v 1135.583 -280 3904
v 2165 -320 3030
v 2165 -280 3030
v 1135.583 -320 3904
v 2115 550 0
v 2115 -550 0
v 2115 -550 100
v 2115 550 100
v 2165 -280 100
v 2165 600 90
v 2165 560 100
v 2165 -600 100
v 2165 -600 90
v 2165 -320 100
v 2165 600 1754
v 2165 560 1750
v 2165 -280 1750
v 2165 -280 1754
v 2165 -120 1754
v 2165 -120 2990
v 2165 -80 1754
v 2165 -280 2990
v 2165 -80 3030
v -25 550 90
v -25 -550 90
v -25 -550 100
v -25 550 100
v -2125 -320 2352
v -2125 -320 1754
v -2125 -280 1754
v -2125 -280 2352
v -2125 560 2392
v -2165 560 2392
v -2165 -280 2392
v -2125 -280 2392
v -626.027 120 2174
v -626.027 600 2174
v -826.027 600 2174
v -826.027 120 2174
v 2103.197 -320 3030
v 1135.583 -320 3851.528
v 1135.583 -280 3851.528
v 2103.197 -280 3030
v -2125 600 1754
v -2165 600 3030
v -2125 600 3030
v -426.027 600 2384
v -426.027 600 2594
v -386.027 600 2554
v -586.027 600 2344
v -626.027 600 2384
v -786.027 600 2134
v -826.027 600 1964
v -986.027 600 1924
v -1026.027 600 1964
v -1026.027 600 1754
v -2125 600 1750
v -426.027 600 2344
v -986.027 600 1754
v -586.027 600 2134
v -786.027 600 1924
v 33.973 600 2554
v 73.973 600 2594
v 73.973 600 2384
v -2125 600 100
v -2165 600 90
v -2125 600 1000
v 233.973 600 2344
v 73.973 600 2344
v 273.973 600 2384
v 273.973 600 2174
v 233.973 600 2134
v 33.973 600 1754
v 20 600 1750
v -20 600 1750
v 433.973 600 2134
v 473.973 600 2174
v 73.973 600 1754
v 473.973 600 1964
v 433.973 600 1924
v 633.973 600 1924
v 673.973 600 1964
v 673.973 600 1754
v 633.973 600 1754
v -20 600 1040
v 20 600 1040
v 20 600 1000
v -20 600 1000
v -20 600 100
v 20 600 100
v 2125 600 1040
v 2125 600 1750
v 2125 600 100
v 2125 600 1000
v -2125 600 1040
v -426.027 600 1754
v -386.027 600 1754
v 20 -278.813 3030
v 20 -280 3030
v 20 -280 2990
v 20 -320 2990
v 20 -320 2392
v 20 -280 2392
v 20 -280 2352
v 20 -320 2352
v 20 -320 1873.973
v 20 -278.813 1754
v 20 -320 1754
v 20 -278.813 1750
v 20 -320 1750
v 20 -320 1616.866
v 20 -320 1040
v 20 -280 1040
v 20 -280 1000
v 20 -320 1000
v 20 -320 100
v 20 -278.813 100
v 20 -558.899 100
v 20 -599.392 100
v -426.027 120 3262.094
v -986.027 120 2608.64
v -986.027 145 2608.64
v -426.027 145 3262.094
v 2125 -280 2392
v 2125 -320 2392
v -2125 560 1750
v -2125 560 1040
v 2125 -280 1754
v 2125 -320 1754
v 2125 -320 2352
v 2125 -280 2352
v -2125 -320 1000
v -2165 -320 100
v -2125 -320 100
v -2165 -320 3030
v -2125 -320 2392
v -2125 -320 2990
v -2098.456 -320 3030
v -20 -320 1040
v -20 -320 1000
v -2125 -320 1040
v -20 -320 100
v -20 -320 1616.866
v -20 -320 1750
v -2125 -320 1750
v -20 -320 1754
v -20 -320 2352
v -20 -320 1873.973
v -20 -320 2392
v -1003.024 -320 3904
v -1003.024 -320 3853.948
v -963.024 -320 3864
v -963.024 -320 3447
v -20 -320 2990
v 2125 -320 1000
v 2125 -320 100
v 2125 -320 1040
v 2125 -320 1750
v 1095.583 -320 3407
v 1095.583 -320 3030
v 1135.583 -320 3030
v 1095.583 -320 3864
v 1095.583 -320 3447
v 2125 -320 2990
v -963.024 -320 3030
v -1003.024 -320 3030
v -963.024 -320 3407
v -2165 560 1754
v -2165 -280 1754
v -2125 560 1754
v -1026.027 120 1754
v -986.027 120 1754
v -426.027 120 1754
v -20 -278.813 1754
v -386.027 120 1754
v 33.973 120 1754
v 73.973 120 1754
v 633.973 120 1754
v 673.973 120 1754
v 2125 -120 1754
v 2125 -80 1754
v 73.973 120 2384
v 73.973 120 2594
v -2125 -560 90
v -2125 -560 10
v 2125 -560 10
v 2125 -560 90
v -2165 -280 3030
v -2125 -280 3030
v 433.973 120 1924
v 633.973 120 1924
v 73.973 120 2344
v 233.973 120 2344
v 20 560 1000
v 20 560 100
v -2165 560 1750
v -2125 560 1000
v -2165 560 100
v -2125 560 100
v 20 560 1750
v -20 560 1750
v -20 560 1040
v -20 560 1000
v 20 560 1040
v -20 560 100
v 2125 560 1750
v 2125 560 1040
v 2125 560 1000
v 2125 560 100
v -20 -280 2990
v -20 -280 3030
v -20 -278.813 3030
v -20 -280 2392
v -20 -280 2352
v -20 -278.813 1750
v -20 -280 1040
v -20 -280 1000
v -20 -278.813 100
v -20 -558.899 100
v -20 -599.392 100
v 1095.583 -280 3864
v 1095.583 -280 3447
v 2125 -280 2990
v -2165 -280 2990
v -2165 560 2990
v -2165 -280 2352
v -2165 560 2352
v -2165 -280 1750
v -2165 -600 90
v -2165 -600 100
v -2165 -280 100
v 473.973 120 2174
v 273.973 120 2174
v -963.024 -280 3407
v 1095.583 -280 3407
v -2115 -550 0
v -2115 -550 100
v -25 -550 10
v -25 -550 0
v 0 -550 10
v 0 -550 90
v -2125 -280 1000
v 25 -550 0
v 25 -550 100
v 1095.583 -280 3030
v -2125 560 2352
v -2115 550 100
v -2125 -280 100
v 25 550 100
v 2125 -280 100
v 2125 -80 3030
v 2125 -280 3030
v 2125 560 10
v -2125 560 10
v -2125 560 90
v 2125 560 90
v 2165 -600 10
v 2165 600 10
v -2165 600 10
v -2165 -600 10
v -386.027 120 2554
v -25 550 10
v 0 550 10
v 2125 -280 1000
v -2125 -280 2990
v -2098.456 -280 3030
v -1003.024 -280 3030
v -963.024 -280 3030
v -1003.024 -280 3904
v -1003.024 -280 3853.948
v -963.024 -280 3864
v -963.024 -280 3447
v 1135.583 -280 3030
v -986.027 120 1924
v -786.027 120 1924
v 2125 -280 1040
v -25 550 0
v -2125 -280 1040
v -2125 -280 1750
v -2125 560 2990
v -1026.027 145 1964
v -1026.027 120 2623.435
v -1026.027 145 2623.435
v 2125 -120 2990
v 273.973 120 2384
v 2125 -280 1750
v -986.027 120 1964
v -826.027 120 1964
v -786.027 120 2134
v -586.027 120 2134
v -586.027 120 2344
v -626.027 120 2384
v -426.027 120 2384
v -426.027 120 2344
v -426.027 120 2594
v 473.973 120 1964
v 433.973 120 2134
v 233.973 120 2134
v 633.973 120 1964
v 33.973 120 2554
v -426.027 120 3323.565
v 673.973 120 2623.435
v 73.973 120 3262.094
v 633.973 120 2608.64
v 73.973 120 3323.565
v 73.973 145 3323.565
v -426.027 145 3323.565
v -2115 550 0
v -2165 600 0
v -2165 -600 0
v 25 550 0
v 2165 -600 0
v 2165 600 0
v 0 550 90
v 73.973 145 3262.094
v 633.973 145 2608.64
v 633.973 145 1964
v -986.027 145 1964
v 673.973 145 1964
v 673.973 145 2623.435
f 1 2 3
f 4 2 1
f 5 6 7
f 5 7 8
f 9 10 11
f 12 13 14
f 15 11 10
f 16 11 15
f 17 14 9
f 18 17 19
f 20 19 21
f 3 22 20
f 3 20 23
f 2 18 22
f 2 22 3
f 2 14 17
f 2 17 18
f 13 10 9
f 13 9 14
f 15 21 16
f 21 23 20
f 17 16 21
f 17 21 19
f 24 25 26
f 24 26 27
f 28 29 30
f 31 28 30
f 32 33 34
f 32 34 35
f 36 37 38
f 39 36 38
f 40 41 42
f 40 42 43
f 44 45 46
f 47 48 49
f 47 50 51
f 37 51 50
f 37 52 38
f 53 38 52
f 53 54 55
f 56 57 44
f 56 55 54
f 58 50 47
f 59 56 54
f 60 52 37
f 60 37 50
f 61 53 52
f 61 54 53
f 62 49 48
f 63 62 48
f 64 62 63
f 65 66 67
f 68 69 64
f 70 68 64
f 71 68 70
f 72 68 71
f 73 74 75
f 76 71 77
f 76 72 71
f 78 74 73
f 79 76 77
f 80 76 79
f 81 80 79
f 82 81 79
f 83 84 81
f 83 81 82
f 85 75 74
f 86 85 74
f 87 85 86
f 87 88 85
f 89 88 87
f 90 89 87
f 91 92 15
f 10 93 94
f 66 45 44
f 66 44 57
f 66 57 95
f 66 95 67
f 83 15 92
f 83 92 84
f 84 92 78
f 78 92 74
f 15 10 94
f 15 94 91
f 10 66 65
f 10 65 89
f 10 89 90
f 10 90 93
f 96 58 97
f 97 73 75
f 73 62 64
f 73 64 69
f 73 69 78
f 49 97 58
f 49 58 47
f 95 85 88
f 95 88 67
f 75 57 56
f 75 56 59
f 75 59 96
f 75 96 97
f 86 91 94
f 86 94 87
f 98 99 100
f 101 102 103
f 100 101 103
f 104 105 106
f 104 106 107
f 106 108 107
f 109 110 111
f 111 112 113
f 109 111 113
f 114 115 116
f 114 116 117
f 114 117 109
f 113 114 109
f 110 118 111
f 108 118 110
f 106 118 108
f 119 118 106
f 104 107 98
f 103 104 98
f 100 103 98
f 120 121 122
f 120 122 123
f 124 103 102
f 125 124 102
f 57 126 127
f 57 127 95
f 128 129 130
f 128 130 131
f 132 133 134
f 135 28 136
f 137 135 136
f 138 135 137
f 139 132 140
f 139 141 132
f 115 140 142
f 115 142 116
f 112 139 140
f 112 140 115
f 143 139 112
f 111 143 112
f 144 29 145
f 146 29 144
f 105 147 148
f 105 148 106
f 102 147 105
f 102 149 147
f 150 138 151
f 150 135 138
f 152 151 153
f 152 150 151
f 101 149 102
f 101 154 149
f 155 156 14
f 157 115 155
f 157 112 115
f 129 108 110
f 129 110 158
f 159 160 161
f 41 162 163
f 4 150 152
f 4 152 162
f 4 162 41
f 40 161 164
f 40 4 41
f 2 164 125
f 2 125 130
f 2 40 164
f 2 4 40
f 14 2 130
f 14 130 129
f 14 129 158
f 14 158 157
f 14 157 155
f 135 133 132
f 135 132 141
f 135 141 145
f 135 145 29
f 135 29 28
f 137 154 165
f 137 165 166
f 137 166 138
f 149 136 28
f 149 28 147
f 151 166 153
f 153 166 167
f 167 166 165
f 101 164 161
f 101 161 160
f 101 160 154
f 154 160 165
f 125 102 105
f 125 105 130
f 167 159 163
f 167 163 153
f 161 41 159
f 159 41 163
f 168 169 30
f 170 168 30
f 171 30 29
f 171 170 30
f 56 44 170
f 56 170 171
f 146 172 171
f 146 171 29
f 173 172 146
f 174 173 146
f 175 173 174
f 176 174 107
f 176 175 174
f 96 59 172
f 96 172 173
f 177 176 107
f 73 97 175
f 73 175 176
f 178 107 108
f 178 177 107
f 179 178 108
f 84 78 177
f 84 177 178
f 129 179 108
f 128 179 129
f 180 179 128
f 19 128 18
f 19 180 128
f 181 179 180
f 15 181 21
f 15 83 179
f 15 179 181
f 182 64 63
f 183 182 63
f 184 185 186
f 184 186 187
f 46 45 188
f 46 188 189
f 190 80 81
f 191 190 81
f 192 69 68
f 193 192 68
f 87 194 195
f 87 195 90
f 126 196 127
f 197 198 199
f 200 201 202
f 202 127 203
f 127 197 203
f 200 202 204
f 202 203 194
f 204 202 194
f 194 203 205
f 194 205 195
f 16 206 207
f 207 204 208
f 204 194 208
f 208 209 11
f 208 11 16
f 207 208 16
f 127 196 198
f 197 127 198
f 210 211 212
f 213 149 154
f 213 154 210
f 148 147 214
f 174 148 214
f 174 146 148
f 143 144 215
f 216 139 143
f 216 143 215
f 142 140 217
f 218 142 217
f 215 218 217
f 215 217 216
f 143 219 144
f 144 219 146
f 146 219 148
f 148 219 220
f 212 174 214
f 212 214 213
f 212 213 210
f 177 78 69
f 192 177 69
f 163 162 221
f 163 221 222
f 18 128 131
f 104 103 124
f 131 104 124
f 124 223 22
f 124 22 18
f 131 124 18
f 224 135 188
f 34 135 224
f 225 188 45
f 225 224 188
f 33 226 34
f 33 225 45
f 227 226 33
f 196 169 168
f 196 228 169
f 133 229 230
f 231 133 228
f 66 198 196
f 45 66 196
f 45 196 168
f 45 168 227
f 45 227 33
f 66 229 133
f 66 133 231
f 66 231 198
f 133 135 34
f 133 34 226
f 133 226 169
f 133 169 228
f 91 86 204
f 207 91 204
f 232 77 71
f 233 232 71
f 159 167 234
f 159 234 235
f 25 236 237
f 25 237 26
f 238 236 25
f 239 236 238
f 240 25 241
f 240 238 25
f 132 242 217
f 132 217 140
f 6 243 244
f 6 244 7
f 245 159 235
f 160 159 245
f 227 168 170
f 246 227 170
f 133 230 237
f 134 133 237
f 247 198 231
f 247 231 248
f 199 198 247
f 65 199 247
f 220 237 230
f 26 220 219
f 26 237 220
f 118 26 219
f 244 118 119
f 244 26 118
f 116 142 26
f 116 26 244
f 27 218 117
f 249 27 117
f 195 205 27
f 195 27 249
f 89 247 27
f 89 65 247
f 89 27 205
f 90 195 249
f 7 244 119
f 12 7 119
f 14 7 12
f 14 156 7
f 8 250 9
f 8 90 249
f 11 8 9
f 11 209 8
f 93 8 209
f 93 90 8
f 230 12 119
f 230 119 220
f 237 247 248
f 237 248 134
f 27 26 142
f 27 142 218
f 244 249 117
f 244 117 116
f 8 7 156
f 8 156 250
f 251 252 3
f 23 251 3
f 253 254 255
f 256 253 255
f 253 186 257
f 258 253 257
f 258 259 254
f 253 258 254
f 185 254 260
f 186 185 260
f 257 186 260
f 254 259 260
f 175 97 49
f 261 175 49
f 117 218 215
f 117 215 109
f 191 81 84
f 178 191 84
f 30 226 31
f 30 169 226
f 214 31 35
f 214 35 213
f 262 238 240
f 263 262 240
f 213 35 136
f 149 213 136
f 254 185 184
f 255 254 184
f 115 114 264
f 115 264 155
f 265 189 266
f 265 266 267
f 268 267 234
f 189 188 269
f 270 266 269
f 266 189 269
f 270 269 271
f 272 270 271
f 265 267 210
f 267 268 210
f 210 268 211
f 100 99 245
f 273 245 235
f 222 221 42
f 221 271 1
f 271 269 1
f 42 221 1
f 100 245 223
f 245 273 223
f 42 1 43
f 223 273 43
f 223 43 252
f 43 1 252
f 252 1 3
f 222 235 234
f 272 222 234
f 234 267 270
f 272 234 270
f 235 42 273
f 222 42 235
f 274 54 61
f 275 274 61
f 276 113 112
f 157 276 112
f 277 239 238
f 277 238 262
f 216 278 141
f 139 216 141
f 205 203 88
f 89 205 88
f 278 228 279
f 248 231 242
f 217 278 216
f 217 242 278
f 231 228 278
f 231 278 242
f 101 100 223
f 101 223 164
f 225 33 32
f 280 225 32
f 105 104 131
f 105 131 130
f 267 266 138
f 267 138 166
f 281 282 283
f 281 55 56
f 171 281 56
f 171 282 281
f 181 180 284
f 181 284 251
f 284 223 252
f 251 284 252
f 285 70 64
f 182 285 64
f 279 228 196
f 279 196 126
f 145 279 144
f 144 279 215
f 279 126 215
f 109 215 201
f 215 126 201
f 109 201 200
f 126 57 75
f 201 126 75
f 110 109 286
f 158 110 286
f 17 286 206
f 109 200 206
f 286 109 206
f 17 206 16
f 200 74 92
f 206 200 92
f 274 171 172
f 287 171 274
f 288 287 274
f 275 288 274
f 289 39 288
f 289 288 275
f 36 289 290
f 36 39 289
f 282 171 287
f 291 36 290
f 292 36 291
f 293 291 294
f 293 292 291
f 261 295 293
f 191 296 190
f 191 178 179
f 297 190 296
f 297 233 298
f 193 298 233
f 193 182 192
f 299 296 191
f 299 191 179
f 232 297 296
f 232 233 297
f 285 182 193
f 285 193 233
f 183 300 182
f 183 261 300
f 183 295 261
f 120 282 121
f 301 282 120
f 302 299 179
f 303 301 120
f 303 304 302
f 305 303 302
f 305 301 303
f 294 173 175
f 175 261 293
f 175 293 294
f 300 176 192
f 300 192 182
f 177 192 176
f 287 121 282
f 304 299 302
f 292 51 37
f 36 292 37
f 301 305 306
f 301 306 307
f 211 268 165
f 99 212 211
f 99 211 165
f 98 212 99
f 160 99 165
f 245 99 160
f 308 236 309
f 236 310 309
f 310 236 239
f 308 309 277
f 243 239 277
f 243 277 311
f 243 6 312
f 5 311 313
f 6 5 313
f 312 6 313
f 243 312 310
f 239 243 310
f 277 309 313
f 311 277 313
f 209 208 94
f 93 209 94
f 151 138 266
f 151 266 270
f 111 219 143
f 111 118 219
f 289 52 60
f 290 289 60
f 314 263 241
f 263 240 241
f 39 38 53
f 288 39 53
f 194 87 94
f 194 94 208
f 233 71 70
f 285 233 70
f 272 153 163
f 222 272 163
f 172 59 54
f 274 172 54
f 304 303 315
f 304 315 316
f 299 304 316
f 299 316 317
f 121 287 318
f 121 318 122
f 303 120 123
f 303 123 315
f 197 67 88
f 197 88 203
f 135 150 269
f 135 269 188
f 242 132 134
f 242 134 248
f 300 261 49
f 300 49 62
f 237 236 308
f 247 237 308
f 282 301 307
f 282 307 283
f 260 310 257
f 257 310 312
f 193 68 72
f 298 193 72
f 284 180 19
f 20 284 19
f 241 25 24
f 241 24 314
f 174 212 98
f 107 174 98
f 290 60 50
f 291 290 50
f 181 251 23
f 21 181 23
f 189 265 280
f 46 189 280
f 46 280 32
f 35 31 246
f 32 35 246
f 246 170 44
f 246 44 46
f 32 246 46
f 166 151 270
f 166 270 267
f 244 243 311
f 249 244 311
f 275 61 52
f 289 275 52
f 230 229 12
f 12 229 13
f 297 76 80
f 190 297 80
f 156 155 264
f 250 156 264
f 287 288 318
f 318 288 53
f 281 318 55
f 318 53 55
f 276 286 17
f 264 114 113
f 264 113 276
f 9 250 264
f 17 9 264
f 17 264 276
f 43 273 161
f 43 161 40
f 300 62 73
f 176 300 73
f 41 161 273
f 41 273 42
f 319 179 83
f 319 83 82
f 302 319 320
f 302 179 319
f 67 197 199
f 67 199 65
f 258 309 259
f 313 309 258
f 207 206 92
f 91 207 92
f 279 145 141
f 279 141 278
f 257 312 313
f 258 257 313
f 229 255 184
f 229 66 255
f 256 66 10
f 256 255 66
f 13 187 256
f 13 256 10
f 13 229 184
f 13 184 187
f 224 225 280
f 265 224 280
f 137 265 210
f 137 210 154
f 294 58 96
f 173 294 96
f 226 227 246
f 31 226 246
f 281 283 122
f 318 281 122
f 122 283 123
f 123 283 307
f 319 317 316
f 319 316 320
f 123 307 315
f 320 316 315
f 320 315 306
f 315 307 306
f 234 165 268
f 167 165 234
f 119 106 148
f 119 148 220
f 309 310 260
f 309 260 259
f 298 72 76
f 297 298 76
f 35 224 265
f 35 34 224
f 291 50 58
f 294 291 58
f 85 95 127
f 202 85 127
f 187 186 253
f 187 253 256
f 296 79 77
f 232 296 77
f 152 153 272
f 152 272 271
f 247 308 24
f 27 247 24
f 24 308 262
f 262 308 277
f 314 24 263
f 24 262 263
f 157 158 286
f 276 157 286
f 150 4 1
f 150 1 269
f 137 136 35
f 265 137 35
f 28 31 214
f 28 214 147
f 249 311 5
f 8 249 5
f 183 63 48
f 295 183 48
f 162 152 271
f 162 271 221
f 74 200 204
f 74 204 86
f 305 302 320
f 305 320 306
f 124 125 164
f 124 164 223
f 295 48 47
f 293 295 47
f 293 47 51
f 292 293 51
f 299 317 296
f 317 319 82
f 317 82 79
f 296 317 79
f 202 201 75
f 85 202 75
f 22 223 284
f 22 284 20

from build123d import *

# Parameters (mm, degrees)
F0_W          = 4330
F0_H          = 1200
F0_W_2        = 2090
F0_H_2        = 1100
F1_DEPTH      = 100
F2_W          = 40
F2_H          = 80
F3_DEPTH      = 4330.001
F4_W          = 40
F4_H          = 80
F5_DEPTH      = 1160.001
F7_W          = 90
F7_H          = 80
F8_DEPTH      = 550
F8_DEPTH_BACK = 550
F9_W          = 40
F9_H          = 41.1868984448
F9_H_2        = 40
F10_DEPTH     = 2930
F11_W         = 4330
F11_H         = 920
F12_DEPTH     = 4
F13_DEPTH     = 1650
F14_W         = 40
F14_H         = 40
F15_DEPTH     = 4300
F16_W         = 40
F16_H         = 40
F17_DEPTH     = 920
F19_DEPTH     = 20
F22_DEPTH     = 480
F23_W         = 2058.6071851103
F23_H         = 40
F24_DEPTH     = 40
F25_W         = 40
F25_H         = 40
F26_DEPTH     = 1250
F27_W         = 40
F27_H         = 40
F28_DEPTH     = 240
F30_DEPTH     = 25


# Not quite as in the source:
# - a feature names something its author has since deleted; it is built from what else it names


with BuildPart() as f1:
    # F0 (on Top) → F1 (new body)
    with BuildSketch(Plane.XY):
        Rectangle(F0_W, F0_H)
        with Locations((-1070, 0)):
            Rectangle(F0_W_2, F0_H_2, mode=Mode.SUBTRACT)
        with Locations((1070, 0)):
            Rectangle(F0_W_2, F0_H_2, mode=Mode.SUBTRACT)
    extrude(amount=F1_DEPTH)

    # F2 (on face) → F3 (cut, through all)
    with BuildSketch(Plane(origin=(-2165, 0, 0), x_dir=(0, -1, 0), z_dir=(-1, 0, 0))):
        with Locations((-580, 50)):
            Rectangle(F2_W, F2_H)
        with Locations((580, 50)):
            Rectangle(F2_W, F2_H)
    extrude(amount=-F3_DEPTH, mode=Mode.SUBTRACT)

    # F4 (on face) → F5 (cut, through all)
    with BuildSketch(Plane.XZ.offset(560)):
        with Locations((2145, 50)):
            Rectangle(F4_W, F4_H)
        with Locations((-2145, 50)):
            Rectangle(F4_W, F4_H)
    extrude(amount=-F5_DEPTH, mode=Mode.SUBTRACT)

    # F7 (on Front) → F8 (cut, two sides)
    with BuildSketch(Plane.XZ) as f8_sk:
        with Locations((-45, 50)):
            Rectangle(F7_W, F7_H)
    extrude(amount=-F8_DEPTH, mode=Mode.SUBTRACT)
    extrude(f8_sk.sketch, amount=F8_DEPTH_BACK, mode=Mode.SUBTRACT)

    # F9 (on face) → F10 (join)
    with BuildSketch(Plane.XY.offset(100)):
        with Locations((0, -299.4065507776)):
            Rectangle(F9_W, F9_H)
        with Locations((2145, -300)):
            Rectangle(F9_W, F9_H_2)
        with Locations((-2145, -300)):
            Rectangle(F9_W, F9_H_2)
        with Locations((-2145, 580)):
            Rectangle(F9_W, F9_H_2)
    extrude(amount=F10_DEPTH)

    # F11 (on offset) → F12 (join)
    with BuildSketch(Plane.XY.offset(1750)):
        with Locations((0, 140)):
            Rectangle(F11_W, F11_H)
    extrude(amount=F12_DEPTH)

    # F9 (on face) → F13 (join)
    with BuildSketch(Plane.XY.offset(100)):
        with Locations((-2145, 580)):
            Rectangle(F9_W, F9_H_2)
        with Locations((2145, 580)):
            Rectangle(F9_W, F9_H_2)
        with Locations((0, 580)):
            Rectangle(F9_W, F9_H_2)
        with Locations((-2145, -300)):
            Rectangle(F9_W, F9_H_2)
        with Locations((0, -299.4065507776)):
            Rectangle(F9_W, F9_H)
        with Locations((2145, -300)):
            Rectangle(F9_W, F9_H_2)
    extrude(amount=F13_DEPTH)

    # F14 (on face) → F15 (join)
    with BuildSketch(Plane(origin=(-2165, 0, 0), x_dir=(0, -1, 0), z_dir=(-1, 0, 0))):
        with Locations((300, 3010)):
            Rectangle(F14_W, F14_H)
        with Locations((-580, 1020)):
            Rectangle(F14_W, F14_H)
        with Locations((300, 1020)):
            Rectangle(F14_W, F14_H)
        with Locations((300, 2372)):
            Rectangle(F14_W, F14_H)
    extrude(amount=-F15_DEPTH)

    # F16 (on face) → F17 (join)
    with BuildSketch(Plane.XZ.offset(320)):
        with Locations((-2145, 3010)):
            Rectangle(F16_W, F16_H)
        with Locations((-2145, 2372)):
            Rectangle(F16_W, F16_H)
    extrude(amount=-F17_DEPTH)

    # F18 (on Right) → F19 (join, symmetric)
    with BuildSketch(Plane.YZ):
        Polygon((-286.3633334637, 1830.4388523102), (-316.2524058579, 1897.7677787981), (-599.6056199074, 98.6450761557), (-559.1808541492, 98.2114738751), align=None)
    extrude(amount=F19_DEPTH, both=True)

    # F21 (on offset) → F22 (join)
    with BuildSketch(Plane.XZ.offset(-600)):
        Polygon((33.9729112002, 1754), (73.9729112002, 1754), (73.9729112002, 2344), (73.9729112002, 2384), (73.9729112002, 2594), (-426.0270887998, 2594), (-426.0270887998, 2384), (-426.0270887998, 2344), (-426.0270887998, 1754), (-386.0270887998, 1754), (-386.0270887998, 2554), (33.9729112002, 2554), align=None)
        Polygon((73.9729112002, 2384), (73.9729112002, 2344), (233.9729112002, 2344), (233.9729112002, 2134), (433.9729112002, 2134), (433.9729112002, 1964), (473.9729112002, 1964), (473.9729112002, 2174), (273.9729112002, 2174), (273.9729112002, 2384), align=None)
        Polygon((-426.0270887998, 2344), (-426.0270887998, 2384), (-626.0270887998, 2384), (-626.0270887998, 2174), (-826.0270887998, 2174), (-826.0270887998, 1964), (-786.0270887998, 1964), (-786.0270887998, 2134), (-586.0270887998, 2134), (-586.0270887998, 2344), align=None)
        Polygon((473.9729112002, 1964), (433.9729112002, 1964), (433.9729112002, 1924), (633.9729112002, 1924), (633.9729112002, 1754), (673.9729112002, 1754), (673.9729112002, 1964), align=None)
        Polygon((-786.0270887998, 1964), (-826.0270887998, 1964), (-1026.0270887998, 1964), (-1026.0270887998, 1754), (-986.0270887998, 1754), (-986.0270887998, 1924), (-786.0270887998, 1924), align=None)
    extrude(amount=F22_DEPTH)

    # F23 (on face) → F24 (join)
    with BuildSketch(Plane.XZ.offset(320)):
        Polygon((-2098.4561880843, 3030), (-1003.0238811955, 3853.9479458544), (-1003.0238811955, 3904), (-2165, 3030), align=None)
        Polygon((-1003.0238811955, 3853.9479458544), (-1003.0238811955, 3030), (-963.0238811955, 3030), (-963.0238811955, 3407), (-963.0238811955, 3447), (-963.0238811955, 3864), (1095.5833039148, 3864), (1095.5833039148, 3447), (1095.5833039148, 3407), (1095.5833039148, 3030), (1135.5833039148, 3030), (1135.5833039148, 3851.5276437165), (1135.5833039148, 3904), (-1003.0238811955, 3904), align=None)
        with Locations((66.2797113596, 3427)):
            Rectangle(F23_W, F23_H)
        Polygon((2165, 3030), (1135.5833039148, 3904), (1135.5833039148, 3851.5276437165), (2103.1968882824, 3030), align=None)
    extrude(amount=-F24_DEPTH)

    # F25 (on face) → F26 (join)
    with BuildSketch(Plane.XY.offset(1754)):
        with Locations((2145, -100)):
            Rectangle(F25_W, F25_H)
    extrude(amount=F26_DEPTH)

    # F27 (on face) → F28 (join)
    with BuildSketch(Plane.XZ.offset(320)):
        with Locations((2145, 3010)):
            Rectangle(F27_W, F27_H)
    extrude(amount=-F28_DEPTH)

    # F29 (on face) → F30 (join)
    with BuildSketch(Plane.XZ.offset(-120)):
        Polygon((-1026.0270887998, 2623.4350204468), (-1026.0270887998, 1964), (-986.0270887998, 1964), (-986.0270887998, 2608.6401382994), (-426.0270887998, 3262.0944976807), (-176.0270887998, 3262.0944976807), (-176.0270887998, 3323.5646912124), (-426.0270887998, 3323.5646912124), align=None)
        Polygon((73.9729112002, 3323.5646912124), (-176.0270887998, 3323.5646912124), (-176.0270887998, 3262.0944976807), (73.9729112002, 3262.0944976807), (633.9729112002, 2608.6401382994), (633.9729112002, 1964), (673.9729112002, 1964), (673.9729112002, 2623.4350204468), align=None)
    extrude(amount=-F30_DEPTH)


solid = f1.part
